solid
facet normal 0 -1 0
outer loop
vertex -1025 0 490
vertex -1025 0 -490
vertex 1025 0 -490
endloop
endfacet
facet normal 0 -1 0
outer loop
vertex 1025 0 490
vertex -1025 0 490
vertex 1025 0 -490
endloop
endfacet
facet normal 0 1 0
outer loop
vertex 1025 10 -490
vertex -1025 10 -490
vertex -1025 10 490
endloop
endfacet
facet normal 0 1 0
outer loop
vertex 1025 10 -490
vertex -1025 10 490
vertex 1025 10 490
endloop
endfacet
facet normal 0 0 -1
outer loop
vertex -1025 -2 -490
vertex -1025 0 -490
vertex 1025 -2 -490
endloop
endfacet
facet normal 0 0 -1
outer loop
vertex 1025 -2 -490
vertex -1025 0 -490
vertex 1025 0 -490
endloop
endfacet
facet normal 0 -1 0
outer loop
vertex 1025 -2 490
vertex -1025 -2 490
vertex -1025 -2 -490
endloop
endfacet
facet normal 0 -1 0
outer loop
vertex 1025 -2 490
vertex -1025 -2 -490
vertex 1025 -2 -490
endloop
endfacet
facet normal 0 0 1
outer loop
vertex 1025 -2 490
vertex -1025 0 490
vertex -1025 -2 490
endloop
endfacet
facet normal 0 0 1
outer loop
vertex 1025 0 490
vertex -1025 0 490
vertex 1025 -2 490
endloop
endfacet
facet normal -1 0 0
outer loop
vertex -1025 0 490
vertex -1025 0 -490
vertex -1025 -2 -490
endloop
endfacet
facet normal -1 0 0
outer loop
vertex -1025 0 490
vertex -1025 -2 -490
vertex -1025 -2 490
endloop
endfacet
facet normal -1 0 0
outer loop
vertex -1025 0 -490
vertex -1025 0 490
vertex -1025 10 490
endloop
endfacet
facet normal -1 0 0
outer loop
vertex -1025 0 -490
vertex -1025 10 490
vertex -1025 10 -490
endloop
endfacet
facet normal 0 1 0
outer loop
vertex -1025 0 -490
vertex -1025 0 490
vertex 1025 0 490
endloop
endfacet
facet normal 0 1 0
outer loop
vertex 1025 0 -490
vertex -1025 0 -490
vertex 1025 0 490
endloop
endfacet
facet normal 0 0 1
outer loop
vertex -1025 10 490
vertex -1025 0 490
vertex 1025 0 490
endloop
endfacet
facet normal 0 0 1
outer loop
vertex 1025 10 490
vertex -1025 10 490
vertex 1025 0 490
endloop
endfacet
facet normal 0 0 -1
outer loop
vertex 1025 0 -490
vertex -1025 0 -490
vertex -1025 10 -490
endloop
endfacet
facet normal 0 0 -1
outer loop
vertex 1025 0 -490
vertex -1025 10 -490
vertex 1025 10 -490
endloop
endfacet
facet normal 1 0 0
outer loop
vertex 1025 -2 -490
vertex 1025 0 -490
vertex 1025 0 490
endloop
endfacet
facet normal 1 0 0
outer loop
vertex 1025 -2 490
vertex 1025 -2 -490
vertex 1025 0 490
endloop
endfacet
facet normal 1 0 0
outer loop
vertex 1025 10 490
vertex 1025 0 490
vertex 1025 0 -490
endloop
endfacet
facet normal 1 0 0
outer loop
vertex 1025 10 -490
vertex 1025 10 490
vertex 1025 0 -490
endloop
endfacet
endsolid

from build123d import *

# Parameters (mm, degrees)
CROQUIS1_W     = 2050
CROQUIS1_H     = 980
EXTRUIR1_DEPTH = 10
CROQUIS2_W     = 2050
CROQUIS2_H     = 980
EXTRUIR2_DEPTH = 2


with BuildPart() as part:
    # Croquis1 → Extruir1 (new body)
    with BuildSketch(Plane(origin=(0, 0, 0), x_dir=(1, 0, 0), z_dir=(0, 1, 0))):
        Rectangle(CROQUIS1_W, CROQUIS1_H)
    extrude(amount=EXTRUIR1_DEPTH)


with BuildPart() as body_2:
    # Croquis2 → Extruir2 (new body)
    with BuildSketch(Plane.XZ):
        Rectangle(CROQUIS2_W, CROQUIS2_H)
    extrude(amount=EXTRUIR2_DEPTH)


solid = Compound([part.part, body_2.part])
